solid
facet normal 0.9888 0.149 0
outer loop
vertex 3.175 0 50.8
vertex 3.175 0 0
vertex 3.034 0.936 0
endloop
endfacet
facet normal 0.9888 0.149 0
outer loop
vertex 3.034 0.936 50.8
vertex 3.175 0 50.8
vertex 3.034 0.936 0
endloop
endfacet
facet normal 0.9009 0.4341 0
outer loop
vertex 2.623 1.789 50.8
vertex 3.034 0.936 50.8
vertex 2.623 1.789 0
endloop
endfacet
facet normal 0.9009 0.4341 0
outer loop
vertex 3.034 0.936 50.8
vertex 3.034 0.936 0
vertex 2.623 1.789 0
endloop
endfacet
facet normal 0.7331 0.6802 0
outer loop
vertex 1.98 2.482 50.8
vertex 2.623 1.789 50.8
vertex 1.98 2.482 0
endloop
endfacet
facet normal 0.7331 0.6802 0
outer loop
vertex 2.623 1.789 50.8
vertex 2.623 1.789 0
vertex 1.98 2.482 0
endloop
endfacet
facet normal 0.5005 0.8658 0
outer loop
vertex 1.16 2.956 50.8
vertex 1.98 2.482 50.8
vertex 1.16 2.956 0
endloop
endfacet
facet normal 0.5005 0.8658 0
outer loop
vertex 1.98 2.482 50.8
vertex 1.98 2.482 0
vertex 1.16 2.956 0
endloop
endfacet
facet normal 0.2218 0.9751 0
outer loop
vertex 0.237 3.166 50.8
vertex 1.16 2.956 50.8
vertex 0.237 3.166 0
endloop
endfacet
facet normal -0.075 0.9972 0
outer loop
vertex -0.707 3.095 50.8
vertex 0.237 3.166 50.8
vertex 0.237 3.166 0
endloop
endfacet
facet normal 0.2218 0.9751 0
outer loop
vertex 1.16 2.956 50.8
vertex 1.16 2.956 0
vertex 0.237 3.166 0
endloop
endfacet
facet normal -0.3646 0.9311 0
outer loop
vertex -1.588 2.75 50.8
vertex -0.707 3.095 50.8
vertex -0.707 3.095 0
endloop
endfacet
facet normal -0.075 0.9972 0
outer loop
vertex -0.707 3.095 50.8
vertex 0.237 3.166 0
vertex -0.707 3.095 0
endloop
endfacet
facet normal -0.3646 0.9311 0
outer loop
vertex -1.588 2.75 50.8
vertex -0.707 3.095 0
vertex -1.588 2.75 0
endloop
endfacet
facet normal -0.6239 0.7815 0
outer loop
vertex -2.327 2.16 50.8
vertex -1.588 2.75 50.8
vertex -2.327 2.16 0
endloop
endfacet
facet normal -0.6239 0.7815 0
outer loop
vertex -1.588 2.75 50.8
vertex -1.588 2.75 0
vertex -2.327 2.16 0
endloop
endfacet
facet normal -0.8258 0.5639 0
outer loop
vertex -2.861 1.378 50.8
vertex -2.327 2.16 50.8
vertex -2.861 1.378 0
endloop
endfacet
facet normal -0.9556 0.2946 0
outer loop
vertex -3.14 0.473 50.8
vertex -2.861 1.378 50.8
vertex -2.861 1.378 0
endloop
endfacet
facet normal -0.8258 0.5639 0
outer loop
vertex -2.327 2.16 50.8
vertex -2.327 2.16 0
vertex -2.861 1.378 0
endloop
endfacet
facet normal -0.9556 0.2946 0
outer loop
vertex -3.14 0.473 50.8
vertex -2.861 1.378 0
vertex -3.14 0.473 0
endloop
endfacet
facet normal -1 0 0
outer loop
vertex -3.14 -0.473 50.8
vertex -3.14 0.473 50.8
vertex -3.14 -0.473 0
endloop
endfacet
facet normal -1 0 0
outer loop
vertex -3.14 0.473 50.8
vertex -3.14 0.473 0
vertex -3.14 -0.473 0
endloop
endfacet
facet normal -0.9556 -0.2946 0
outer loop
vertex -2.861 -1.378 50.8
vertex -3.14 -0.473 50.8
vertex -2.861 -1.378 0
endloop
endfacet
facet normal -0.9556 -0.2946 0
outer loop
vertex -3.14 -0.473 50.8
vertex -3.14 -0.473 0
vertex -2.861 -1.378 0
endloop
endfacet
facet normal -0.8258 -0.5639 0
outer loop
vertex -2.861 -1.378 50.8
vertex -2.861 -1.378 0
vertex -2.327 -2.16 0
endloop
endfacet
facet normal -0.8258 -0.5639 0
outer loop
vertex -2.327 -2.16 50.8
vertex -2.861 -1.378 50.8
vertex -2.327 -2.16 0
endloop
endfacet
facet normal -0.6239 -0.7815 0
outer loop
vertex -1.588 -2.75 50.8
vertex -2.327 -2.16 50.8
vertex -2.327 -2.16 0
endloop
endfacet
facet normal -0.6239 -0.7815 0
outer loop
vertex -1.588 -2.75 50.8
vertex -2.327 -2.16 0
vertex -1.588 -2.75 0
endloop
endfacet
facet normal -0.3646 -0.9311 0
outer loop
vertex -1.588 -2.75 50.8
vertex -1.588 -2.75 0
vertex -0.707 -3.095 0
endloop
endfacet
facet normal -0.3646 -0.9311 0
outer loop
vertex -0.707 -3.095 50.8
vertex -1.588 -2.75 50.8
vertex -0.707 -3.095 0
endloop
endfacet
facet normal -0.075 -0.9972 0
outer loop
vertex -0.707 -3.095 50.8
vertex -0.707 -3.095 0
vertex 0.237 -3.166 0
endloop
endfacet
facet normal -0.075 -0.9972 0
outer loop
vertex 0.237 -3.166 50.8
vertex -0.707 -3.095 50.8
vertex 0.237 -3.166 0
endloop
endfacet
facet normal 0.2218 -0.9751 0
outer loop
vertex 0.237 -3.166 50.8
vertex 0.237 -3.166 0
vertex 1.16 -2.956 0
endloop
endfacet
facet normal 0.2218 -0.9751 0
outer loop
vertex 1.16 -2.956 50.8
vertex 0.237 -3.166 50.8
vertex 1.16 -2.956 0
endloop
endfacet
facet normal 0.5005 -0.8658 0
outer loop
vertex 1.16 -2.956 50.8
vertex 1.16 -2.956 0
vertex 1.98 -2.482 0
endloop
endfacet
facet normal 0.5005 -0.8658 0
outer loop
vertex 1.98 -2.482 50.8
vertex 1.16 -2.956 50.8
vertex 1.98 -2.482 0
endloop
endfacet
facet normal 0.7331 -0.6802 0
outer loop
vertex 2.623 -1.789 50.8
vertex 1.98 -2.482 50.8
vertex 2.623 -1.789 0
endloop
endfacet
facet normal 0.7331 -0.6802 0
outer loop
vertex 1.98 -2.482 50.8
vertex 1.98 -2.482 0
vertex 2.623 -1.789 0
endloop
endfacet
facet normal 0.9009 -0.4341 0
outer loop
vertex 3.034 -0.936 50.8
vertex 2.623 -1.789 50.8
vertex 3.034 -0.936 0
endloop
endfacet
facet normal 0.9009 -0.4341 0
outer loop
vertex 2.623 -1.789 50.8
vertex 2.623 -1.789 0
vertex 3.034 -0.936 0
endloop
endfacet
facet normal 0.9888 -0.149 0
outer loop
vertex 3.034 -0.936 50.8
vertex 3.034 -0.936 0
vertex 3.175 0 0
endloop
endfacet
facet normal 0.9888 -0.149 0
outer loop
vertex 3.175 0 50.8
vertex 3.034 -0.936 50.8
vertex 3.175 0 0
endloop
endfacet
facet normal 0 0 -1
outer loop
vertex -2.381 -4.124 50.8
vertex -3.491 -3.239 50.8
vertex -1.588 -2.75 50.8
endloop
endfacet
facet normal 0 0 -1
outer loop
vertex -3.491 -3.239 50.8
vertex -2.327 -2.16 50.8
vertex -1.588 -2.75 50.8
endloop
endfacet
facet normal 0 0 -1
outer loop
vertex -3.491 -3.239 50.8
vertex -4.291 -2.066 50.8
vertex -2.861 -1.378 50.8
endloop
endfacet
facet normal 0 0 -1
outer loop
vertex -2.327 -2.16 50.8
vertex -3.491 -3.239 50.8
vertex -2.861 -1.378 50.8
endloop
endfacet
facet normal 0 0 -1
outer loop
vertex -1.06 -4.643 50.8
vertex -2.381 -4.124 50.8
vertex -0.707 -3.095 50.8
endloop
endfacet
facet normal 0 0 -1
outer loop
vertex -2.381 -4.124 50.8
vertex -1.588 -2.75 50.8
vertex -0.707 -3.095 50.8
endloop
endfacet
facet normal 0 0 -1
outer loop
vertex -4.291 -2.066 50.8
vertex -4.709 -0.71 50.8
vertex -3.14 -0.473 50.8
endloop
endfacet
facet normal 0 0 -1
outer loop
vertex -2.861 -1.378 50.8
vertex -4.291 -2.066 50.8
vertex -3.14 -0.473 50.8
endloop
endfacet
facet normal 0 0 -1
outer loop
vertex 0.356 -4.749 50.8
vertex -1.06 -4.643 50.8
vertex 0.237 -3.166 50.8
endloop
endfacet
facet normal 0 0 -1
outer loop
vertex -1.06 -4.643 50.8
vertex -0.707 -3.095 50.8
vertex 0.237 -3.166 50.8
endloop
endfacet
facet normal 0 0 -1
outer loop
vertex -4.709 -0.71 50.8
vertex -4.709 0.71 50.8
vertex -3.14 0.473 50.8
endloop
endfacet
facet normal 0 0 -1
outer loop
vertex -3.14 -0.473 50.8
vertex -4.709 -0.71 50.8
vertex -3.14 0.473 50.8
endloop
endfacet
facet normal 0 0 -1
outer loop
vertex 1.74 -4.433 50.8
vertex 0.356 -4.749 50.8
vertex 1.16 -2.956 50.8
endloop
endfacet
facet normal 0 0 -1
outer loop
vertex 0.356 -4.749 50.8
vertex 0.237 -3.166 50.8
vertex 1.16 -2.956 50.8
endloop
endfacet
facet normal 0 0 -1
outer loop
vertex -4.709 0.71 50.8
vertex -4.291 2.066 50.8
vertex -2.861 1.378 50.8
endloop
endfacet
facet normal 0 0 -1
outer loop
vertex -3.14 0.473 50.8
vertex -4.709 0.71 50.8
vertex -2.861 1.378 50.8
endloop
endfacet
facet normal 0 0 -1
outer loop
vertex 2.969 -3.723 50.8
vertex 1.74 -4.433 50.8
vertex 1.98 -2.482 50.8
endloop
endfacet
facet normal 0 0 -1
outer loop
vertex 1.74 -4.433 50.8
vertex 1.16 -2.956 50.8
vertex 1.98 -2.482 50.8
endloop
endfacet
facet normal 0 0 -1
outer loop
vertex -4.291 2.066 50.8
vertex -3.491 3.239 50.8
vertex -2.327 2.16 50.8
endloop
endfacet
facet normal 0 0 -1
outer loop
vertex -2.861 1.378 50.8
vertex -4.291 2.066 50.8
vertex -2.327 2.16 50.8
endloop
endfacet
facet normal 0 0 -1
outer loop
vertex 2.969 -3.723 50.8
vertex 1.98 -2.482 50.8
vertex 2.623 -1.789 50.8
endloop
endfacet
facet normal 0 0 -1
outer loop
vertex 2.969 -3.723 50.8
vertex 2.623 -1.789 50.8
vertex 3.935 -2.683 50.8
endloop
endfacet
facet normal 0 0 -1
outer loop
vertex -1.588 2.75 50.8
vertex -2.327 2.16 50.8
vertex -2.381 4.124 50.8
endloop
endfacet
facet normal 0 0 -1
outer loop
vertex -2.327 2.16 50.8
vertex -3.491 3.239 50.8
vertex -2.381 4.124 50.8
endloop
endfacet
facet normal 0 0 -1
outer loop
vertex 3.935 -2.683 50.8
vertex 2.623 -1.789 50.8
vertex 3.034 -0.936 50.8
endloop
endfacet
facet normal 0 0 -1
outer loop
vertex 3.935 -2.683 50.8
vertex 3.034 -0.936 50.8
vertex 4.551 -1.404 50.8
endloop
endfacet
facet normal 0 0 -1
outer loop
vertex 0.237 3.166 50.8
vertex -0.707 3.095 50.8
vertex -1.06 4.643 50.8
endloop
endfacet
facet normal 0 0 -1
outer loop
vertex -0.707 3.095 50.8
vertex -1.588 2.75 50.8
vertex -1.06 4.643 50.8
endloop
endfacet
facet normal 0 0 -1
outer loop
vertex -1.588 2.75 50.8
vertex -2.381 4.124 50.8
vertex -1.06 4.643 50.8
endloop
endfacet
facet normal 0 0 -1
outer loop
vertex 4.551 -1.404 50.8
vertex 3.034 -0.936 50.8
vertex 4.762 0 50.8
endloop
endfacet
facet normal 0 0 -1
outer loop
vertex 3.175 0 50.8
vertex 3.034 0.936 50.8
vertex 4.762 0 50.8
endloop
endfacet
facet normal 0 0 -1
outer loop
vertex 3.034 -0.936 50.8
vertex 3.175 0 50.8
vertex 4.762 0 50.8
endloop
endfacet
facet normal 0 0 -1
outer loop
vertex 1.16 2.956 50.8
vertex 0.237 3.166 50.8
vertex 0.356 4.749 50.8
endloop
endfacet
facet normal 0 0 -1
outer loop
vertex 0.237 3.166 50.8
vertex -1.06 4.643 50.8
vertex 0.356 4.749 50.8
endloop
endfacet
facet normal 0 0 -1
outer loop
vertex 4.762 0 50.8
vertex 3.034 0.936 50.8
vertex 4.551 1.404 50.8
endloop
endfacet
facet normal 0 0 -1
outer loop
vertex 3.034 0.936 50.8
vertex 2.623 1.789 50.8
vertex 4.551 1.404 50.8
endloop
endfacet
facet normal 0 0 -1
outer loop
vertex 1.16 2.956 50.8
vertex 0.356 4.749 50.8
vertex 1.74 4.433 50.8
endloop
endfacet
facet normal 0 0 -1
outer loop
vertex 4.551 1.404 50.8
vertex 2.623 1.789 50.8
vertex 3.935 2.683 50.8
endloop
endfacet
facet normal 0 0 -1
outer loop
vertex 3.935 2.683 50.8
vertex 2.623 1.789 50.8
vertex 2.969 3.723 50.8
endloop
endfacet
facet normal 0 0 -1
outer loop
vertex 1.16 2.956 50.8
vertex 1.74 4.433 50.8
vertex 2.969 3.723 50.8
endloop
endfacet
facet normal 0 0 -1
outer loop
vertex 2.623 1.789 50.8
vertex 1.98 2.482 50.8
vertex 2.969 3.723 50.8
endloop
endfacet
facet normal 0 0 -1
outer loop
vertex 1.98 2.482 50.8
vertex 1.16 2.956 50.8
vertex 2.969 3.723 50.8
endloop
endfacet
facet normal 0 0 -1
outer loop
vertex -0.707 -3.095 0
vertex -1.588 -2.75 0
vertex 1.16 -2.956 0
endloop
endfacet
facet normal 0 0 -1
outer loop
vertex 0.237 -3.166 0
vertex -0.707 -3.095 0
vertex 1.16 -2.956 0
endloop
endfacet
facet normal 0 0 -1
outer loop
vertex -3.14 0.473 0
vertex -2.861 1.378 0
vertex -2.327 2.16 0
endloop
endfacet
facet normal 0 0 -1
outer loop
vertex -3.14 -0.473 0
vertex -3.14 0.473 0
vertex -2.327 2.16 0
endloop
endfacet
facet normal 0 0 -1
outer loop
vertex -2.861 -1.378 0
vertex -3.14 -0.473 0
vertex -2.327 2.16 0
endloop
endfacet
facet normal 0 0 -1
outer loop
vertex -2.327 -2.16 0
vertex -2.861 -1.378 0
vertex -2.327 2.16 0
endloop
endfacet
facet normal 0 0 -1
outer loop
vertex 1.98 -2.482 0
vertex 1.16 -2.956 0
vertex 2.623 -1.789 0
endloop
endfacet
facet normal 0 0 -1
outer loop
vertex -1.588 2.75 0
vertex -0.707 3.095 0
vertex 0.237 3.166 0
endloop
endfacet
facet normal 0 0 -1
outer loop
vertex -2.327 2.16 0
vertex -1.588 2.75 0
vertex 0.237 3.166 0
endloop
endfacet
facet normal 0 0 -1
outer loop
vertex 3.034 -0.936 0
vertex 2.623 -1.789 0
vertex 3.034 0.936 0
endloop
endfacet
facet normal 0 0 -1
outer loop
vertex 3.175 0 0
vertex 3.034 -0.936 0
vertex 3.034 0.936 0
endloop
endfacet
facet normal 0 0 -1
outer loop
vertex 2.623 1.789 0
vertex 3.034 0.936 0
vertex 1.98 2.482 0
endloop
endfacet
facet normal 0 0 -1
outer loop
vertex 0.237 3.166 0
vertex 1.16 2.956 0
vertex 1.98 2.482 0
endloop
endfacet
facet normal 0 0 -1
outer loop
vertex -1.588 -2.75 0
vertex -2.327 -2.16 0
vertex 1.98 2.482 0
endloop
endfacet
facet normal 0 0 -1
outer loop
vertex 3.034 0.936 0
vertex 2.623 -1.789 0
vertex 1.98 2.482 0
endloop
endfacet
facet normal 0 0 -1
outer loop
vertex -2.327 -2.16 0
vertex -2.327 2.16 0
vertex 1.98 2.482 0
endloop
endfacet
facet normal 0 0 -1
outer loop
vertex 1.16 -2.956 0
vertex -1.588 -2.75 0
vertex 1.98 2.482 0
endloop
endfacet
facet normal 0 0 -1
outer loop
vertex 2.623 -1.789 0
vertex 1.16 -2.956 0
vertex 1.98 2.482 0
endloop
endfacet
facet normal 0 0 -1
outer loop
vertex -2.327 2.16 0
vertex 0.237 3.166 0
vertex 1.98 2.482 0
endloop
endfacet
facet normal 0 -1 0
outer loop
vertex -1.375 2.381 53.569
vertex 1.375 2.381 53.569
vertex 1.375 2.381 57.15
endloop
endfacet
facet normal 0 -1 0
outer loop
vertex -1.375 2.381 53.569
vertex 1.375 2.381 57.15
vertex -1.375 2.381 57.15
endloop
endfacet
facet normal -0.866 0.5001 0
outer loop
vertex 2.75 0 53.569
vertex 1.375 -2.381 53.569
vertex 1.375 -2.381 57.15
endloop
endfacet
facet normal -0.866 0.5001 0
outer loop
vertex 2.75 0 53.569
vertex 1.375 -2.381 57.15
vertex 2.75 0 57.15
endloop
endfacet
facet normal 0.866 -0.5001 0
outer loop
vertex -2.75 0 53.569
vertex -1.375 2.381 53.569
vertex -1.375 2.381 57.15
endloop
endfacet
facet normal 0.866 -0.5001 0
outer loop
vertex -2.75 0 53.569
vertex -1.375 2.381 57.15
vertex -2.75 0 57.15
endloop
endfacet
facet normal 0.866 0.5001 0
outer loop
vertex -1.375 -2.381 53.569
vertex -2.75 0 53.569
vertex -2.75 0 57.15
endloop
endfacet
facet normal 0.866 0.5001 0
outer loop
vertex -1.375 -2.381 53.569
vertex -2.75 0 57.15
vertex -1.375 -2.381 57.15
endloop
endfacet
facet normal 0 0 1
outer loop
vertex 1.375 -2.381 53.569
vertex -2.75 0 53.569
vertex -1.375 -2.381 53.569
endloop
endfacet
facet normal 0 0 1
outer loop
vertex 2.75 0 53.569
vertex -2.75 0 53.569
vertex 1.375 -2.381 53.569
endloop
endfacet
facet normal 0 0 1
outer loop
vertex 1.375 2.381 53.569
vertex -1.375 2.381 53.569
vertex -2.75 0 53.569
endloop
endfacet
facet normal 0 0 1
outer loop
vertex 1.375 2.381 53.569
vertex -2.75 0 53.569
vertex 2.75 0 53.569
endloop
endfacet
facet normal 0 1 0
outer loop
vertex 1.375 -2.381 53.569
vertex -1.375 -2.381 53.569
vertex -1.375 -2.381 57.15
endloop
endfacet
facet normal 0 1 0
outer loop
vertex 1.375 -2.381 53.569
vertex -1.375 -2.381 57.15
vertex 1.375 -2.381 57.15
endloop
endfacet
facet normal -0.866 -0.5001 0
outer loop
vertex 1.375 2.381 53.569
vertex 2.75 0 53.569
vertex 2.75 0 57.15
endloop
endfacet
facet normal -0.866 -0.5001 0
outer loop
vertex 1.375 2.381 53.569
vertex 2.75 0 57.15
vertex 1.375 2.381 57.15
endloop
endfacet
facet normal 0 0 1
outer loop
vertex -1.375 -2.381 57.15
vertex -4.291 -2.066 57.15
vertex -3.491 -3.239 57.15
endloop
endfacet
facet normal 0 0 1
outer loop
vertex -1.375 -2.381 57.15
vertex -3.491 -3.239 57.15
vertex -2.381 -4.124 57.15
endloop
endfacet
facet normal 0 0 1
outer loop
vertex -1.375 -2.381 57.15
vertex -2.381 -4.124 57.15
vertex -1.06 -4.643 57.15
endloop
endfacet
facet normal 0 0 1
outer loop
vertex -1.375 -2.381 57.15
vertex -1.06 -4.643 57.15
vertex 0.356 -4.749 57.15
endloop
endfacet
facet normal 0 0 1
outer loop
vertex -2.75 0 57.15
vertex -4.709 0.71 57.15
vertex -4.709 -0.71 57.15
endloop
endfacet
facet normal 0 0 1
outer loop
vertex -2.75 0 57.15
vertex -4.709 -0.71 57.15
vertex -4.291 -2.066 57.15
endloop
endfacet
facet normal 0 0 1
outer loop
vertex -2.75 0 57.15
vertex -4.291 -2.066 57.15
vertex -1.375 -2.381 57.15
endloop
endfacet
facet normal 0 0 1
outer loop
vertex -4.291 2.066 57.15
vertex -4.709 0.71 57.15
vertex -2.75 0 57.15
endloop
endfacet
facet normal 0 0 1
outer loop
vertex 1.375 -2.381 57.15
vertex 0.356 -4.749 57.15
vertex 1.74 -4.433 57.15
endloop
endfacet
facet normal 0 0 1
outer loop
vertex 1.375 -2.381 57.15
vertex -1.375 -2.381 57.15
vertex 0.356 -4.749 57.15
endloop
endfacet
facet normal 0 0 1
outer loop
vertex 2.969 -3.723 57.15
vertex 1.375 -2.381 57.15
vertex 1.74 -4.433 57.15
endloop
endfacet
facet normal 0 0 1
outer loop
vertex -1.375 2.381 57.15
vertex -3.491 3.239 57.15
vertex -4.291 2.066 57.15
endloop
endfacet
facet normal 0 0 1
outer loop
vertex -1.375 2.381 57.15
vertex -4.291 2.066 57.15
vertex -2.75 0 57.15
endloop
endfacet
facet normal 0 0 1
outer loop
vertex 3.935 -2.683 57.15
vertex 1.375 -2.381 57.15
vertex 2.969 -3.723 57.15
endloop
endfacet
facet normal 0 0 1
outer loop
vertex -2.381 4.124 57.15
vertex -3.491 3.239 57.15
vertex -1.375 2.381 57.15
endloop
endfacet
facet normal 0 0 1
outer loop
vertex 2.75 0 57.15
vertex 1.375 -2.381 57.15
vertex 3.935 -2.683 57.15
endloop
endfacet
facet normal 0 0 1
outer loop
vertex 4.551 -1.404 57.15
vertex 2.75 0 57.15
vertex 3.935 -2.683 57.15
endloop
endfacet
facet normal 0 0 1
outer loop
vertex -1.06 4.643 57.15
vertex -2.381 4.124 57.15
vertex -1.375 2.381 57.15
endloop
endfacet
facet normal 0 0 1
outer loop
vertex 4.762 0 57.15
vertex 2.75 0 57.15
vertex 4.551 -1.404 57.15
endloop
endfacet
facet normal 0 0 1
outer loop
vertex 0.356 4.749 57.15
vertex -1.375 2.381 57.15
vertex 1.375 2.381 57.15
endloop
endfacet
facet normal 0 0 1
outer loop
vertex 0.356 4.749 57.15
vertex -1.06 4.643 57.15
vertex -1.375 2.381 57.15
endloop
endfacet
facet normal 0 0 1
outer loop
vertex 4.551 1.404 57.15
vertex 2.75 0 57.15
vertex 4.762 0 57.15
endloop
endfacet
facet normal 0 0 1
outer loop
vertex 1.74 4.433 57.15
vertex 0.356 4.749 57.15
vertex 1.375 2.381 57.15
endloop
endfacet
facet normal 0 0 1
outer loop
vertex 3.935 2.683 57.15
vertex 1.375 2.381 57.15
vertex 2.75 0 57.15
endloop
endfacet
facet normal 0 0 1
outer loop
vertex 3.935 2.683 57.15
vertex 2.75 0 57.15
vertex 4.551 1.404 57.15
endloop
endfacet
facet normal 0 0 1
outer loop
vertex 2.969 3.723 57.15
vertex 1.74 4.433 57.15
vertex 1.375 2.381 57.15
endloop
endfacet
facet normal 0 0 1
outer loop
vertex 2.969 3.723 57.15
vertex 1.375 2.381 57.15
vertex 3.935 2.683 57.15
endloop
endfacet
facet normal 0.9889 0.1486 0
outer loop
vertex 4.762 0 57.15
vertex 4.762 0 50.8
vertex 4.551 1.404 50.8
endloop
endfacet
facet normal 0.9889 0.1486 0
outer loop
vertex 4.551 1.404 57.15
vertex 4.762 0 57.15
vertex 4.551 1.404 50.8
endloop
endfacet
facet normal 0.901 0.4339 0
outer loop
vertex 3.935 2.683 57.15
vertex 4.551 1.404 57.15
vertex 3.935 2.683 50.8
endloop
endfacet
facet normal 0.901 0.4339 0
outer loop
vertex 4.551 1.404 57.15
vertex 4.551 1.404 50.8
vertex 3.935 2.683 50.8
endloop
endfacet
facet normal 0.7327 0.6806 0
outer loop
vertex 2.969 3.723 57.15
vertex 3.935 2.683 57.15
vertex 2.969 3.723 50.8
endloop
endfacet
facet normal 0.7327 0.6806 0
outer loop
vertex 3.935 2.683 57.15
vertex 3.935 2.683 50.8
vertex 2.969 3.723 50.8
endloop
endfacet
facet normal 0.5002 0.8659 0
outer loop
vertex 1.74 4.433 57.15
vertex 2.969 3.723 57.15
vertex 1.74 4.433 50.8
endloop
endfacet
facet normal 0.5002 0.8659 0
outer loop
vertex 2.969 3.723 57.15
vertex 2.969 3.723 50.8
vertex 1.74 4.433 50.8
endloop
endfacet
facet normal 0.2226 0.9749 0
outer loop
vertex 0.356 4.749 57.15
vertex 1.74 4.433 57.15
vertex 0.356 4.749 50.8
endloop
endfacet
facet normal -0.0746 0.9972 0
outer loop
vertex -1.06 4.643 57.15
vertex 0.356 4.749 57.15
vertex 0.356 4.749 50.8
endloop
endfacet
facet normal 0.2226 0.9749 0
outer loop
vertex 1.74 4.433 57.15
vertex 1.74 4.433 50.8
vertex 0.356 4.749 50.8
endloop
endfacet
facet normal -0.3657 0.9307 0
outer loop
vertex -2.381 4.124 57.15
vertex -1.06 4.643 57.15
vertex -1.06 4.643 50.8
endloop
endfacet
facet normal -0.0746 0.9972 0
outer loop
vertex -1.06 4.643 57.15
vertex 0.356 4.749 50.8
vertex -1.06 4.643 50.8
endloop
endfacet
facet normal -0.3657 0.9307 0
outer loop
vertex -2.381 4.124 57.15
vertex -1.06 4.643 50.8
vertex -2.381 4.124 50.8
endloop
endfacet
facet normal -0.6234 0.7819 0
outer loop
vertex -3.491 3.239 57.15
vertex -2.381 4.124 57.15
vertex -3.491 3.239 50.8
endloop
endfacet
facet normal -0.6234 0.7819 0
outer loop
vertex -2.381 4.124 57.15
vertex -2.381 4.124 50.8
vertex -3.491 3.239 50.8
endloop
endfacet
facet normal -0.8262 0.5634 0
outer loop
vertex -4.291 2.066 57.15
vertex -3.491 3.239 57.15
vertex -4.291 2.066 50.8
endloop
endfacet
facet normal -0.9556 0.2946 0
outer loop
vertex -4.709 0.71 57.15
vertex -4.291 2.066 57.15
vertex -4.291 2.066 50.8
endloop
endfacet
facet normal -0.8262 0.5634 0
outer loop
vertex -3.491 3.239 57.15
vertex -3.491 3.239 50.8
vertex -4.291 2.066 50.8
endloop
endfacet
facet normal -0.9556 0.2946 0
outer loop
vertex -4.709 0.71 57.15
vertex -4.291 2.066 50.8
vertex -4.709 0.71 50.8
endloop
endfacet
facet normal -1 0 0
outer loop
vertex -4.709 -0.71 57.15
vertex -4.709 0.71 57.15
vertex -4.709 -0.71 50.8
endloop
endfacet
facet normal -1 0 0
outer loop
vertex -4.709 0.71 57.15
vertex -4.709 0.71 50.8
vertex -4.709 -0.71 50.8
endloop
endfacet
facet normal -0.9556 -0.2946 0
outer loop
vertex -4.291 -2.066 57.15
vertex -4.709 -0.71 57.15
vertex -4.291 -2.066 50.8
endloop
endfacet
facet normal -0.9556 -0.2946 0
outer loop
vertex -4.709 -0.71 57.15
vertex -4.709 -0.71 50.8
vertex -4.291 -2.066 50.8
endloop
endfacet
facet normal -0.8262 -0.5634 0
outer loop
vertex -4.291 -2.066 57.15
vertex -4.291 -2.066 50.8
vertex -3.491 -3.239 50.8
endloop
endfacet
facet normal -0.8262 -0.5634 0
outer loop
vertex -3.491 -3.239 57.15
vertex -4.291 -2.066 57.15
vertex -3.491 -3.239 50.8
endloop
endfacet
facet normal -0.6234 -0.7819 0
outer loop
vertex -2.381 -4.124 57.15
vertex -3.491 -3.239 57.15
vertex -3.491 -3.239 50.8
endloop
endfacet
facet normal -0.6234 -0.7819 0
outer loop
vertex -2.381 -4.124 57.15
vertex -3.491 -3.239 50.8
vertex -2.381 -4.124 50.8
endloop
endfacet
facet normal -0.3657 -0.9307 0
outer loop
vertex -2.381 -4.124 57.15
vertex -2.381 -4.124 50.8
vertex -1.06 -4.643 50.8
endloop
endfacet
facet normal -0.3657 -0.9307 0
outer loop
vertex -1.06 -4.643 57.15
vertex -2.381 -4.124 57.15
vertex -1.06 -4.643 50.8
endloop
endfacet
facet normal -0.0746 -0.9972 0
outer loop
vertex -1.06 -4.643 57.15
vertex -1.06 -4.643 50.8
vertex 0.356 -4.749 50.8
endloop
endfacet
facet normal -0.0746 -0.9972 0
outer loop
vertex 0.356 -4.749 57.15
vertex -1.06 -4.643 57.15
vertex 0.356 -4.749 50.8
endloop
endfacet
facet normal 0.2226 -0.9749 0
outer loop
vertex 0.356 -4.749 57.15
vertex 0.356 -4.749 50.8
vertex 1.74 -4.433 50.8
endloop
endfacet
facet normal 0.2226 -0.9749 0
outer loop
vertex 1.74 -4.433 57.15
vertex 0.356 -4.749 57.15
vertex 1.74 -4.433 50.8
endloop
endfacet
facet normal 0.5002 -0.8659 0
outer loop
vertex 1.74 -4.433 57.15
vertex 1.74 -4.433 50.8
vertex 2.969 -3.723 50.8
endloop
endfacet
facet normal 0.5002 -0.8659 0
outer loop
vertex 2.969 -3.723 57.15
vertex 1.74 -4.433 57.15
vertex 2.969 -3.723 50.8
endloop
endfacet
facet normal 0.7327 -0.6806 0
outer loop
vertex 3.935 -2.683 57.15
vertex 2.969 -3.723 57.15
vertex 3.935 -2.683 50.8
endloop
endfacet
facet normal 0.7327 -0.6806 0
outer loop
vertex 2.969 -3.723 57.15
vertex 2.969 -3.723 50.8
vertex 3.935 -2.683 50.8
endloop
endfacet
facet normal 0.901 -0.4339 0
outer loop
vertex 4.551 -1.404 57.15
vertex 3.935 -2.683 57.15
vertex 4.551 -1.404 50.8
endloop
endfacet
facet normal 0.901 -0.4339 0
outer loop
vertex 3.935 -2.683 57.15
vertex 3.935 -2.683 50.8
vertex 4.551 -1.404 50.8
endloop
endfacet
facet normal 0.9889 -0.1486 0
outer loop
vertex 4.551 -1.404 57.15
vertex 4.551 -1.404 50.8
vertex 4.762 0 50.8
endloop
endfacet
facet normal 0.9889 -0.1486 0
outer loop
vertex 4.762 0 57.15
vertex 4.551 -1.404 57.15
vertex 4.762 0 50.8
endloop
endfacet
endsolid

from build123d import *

# Parameters (mm, degrees)
SKETCH1_R           = 3.175
BOSS_EXTRUDE1_DEPTH = 50.8
SKETCH2_R           = 4.7625
BOSS_EXTRUDE2_DEPTH = 6.35
CUT_EXTRUDE1_DEPTH  = 3.5814


with BuildPart() as part:
    # Sketch1 → Boss-Extrude1 (new body)
    with BuildSketch(Plane.XY):
        Circle(SKETCH1_R)
    extrude(amount=BOSS_EXTRUDE1_DEPTH)

    # Sketch2 → Boss-Extrude2 (add)
    with BuildSketch(Plane.XY.offset(50.8)):
        Circle(SKETCH2_R)
    extrude(amount=BOSS_EXTRUDE2_DEPTH)

    # Sketch3 → Cut-Extrude1 (cut)
    with BuildSketch(Plane.XY.offset(57.15)):
        Polygon((2.749630657, 0), (1.374815329, 2.38125), (-1.374815329, 2.38125), (-2.749630657, 0), (-1.374815329, -2.38125), (1.374815329, -2.38125), align=None)
    extrude(amount=-CUT_EXTRUDE1_DEPTH, mode=Mode.SUBTRACT)


solid = part.part
